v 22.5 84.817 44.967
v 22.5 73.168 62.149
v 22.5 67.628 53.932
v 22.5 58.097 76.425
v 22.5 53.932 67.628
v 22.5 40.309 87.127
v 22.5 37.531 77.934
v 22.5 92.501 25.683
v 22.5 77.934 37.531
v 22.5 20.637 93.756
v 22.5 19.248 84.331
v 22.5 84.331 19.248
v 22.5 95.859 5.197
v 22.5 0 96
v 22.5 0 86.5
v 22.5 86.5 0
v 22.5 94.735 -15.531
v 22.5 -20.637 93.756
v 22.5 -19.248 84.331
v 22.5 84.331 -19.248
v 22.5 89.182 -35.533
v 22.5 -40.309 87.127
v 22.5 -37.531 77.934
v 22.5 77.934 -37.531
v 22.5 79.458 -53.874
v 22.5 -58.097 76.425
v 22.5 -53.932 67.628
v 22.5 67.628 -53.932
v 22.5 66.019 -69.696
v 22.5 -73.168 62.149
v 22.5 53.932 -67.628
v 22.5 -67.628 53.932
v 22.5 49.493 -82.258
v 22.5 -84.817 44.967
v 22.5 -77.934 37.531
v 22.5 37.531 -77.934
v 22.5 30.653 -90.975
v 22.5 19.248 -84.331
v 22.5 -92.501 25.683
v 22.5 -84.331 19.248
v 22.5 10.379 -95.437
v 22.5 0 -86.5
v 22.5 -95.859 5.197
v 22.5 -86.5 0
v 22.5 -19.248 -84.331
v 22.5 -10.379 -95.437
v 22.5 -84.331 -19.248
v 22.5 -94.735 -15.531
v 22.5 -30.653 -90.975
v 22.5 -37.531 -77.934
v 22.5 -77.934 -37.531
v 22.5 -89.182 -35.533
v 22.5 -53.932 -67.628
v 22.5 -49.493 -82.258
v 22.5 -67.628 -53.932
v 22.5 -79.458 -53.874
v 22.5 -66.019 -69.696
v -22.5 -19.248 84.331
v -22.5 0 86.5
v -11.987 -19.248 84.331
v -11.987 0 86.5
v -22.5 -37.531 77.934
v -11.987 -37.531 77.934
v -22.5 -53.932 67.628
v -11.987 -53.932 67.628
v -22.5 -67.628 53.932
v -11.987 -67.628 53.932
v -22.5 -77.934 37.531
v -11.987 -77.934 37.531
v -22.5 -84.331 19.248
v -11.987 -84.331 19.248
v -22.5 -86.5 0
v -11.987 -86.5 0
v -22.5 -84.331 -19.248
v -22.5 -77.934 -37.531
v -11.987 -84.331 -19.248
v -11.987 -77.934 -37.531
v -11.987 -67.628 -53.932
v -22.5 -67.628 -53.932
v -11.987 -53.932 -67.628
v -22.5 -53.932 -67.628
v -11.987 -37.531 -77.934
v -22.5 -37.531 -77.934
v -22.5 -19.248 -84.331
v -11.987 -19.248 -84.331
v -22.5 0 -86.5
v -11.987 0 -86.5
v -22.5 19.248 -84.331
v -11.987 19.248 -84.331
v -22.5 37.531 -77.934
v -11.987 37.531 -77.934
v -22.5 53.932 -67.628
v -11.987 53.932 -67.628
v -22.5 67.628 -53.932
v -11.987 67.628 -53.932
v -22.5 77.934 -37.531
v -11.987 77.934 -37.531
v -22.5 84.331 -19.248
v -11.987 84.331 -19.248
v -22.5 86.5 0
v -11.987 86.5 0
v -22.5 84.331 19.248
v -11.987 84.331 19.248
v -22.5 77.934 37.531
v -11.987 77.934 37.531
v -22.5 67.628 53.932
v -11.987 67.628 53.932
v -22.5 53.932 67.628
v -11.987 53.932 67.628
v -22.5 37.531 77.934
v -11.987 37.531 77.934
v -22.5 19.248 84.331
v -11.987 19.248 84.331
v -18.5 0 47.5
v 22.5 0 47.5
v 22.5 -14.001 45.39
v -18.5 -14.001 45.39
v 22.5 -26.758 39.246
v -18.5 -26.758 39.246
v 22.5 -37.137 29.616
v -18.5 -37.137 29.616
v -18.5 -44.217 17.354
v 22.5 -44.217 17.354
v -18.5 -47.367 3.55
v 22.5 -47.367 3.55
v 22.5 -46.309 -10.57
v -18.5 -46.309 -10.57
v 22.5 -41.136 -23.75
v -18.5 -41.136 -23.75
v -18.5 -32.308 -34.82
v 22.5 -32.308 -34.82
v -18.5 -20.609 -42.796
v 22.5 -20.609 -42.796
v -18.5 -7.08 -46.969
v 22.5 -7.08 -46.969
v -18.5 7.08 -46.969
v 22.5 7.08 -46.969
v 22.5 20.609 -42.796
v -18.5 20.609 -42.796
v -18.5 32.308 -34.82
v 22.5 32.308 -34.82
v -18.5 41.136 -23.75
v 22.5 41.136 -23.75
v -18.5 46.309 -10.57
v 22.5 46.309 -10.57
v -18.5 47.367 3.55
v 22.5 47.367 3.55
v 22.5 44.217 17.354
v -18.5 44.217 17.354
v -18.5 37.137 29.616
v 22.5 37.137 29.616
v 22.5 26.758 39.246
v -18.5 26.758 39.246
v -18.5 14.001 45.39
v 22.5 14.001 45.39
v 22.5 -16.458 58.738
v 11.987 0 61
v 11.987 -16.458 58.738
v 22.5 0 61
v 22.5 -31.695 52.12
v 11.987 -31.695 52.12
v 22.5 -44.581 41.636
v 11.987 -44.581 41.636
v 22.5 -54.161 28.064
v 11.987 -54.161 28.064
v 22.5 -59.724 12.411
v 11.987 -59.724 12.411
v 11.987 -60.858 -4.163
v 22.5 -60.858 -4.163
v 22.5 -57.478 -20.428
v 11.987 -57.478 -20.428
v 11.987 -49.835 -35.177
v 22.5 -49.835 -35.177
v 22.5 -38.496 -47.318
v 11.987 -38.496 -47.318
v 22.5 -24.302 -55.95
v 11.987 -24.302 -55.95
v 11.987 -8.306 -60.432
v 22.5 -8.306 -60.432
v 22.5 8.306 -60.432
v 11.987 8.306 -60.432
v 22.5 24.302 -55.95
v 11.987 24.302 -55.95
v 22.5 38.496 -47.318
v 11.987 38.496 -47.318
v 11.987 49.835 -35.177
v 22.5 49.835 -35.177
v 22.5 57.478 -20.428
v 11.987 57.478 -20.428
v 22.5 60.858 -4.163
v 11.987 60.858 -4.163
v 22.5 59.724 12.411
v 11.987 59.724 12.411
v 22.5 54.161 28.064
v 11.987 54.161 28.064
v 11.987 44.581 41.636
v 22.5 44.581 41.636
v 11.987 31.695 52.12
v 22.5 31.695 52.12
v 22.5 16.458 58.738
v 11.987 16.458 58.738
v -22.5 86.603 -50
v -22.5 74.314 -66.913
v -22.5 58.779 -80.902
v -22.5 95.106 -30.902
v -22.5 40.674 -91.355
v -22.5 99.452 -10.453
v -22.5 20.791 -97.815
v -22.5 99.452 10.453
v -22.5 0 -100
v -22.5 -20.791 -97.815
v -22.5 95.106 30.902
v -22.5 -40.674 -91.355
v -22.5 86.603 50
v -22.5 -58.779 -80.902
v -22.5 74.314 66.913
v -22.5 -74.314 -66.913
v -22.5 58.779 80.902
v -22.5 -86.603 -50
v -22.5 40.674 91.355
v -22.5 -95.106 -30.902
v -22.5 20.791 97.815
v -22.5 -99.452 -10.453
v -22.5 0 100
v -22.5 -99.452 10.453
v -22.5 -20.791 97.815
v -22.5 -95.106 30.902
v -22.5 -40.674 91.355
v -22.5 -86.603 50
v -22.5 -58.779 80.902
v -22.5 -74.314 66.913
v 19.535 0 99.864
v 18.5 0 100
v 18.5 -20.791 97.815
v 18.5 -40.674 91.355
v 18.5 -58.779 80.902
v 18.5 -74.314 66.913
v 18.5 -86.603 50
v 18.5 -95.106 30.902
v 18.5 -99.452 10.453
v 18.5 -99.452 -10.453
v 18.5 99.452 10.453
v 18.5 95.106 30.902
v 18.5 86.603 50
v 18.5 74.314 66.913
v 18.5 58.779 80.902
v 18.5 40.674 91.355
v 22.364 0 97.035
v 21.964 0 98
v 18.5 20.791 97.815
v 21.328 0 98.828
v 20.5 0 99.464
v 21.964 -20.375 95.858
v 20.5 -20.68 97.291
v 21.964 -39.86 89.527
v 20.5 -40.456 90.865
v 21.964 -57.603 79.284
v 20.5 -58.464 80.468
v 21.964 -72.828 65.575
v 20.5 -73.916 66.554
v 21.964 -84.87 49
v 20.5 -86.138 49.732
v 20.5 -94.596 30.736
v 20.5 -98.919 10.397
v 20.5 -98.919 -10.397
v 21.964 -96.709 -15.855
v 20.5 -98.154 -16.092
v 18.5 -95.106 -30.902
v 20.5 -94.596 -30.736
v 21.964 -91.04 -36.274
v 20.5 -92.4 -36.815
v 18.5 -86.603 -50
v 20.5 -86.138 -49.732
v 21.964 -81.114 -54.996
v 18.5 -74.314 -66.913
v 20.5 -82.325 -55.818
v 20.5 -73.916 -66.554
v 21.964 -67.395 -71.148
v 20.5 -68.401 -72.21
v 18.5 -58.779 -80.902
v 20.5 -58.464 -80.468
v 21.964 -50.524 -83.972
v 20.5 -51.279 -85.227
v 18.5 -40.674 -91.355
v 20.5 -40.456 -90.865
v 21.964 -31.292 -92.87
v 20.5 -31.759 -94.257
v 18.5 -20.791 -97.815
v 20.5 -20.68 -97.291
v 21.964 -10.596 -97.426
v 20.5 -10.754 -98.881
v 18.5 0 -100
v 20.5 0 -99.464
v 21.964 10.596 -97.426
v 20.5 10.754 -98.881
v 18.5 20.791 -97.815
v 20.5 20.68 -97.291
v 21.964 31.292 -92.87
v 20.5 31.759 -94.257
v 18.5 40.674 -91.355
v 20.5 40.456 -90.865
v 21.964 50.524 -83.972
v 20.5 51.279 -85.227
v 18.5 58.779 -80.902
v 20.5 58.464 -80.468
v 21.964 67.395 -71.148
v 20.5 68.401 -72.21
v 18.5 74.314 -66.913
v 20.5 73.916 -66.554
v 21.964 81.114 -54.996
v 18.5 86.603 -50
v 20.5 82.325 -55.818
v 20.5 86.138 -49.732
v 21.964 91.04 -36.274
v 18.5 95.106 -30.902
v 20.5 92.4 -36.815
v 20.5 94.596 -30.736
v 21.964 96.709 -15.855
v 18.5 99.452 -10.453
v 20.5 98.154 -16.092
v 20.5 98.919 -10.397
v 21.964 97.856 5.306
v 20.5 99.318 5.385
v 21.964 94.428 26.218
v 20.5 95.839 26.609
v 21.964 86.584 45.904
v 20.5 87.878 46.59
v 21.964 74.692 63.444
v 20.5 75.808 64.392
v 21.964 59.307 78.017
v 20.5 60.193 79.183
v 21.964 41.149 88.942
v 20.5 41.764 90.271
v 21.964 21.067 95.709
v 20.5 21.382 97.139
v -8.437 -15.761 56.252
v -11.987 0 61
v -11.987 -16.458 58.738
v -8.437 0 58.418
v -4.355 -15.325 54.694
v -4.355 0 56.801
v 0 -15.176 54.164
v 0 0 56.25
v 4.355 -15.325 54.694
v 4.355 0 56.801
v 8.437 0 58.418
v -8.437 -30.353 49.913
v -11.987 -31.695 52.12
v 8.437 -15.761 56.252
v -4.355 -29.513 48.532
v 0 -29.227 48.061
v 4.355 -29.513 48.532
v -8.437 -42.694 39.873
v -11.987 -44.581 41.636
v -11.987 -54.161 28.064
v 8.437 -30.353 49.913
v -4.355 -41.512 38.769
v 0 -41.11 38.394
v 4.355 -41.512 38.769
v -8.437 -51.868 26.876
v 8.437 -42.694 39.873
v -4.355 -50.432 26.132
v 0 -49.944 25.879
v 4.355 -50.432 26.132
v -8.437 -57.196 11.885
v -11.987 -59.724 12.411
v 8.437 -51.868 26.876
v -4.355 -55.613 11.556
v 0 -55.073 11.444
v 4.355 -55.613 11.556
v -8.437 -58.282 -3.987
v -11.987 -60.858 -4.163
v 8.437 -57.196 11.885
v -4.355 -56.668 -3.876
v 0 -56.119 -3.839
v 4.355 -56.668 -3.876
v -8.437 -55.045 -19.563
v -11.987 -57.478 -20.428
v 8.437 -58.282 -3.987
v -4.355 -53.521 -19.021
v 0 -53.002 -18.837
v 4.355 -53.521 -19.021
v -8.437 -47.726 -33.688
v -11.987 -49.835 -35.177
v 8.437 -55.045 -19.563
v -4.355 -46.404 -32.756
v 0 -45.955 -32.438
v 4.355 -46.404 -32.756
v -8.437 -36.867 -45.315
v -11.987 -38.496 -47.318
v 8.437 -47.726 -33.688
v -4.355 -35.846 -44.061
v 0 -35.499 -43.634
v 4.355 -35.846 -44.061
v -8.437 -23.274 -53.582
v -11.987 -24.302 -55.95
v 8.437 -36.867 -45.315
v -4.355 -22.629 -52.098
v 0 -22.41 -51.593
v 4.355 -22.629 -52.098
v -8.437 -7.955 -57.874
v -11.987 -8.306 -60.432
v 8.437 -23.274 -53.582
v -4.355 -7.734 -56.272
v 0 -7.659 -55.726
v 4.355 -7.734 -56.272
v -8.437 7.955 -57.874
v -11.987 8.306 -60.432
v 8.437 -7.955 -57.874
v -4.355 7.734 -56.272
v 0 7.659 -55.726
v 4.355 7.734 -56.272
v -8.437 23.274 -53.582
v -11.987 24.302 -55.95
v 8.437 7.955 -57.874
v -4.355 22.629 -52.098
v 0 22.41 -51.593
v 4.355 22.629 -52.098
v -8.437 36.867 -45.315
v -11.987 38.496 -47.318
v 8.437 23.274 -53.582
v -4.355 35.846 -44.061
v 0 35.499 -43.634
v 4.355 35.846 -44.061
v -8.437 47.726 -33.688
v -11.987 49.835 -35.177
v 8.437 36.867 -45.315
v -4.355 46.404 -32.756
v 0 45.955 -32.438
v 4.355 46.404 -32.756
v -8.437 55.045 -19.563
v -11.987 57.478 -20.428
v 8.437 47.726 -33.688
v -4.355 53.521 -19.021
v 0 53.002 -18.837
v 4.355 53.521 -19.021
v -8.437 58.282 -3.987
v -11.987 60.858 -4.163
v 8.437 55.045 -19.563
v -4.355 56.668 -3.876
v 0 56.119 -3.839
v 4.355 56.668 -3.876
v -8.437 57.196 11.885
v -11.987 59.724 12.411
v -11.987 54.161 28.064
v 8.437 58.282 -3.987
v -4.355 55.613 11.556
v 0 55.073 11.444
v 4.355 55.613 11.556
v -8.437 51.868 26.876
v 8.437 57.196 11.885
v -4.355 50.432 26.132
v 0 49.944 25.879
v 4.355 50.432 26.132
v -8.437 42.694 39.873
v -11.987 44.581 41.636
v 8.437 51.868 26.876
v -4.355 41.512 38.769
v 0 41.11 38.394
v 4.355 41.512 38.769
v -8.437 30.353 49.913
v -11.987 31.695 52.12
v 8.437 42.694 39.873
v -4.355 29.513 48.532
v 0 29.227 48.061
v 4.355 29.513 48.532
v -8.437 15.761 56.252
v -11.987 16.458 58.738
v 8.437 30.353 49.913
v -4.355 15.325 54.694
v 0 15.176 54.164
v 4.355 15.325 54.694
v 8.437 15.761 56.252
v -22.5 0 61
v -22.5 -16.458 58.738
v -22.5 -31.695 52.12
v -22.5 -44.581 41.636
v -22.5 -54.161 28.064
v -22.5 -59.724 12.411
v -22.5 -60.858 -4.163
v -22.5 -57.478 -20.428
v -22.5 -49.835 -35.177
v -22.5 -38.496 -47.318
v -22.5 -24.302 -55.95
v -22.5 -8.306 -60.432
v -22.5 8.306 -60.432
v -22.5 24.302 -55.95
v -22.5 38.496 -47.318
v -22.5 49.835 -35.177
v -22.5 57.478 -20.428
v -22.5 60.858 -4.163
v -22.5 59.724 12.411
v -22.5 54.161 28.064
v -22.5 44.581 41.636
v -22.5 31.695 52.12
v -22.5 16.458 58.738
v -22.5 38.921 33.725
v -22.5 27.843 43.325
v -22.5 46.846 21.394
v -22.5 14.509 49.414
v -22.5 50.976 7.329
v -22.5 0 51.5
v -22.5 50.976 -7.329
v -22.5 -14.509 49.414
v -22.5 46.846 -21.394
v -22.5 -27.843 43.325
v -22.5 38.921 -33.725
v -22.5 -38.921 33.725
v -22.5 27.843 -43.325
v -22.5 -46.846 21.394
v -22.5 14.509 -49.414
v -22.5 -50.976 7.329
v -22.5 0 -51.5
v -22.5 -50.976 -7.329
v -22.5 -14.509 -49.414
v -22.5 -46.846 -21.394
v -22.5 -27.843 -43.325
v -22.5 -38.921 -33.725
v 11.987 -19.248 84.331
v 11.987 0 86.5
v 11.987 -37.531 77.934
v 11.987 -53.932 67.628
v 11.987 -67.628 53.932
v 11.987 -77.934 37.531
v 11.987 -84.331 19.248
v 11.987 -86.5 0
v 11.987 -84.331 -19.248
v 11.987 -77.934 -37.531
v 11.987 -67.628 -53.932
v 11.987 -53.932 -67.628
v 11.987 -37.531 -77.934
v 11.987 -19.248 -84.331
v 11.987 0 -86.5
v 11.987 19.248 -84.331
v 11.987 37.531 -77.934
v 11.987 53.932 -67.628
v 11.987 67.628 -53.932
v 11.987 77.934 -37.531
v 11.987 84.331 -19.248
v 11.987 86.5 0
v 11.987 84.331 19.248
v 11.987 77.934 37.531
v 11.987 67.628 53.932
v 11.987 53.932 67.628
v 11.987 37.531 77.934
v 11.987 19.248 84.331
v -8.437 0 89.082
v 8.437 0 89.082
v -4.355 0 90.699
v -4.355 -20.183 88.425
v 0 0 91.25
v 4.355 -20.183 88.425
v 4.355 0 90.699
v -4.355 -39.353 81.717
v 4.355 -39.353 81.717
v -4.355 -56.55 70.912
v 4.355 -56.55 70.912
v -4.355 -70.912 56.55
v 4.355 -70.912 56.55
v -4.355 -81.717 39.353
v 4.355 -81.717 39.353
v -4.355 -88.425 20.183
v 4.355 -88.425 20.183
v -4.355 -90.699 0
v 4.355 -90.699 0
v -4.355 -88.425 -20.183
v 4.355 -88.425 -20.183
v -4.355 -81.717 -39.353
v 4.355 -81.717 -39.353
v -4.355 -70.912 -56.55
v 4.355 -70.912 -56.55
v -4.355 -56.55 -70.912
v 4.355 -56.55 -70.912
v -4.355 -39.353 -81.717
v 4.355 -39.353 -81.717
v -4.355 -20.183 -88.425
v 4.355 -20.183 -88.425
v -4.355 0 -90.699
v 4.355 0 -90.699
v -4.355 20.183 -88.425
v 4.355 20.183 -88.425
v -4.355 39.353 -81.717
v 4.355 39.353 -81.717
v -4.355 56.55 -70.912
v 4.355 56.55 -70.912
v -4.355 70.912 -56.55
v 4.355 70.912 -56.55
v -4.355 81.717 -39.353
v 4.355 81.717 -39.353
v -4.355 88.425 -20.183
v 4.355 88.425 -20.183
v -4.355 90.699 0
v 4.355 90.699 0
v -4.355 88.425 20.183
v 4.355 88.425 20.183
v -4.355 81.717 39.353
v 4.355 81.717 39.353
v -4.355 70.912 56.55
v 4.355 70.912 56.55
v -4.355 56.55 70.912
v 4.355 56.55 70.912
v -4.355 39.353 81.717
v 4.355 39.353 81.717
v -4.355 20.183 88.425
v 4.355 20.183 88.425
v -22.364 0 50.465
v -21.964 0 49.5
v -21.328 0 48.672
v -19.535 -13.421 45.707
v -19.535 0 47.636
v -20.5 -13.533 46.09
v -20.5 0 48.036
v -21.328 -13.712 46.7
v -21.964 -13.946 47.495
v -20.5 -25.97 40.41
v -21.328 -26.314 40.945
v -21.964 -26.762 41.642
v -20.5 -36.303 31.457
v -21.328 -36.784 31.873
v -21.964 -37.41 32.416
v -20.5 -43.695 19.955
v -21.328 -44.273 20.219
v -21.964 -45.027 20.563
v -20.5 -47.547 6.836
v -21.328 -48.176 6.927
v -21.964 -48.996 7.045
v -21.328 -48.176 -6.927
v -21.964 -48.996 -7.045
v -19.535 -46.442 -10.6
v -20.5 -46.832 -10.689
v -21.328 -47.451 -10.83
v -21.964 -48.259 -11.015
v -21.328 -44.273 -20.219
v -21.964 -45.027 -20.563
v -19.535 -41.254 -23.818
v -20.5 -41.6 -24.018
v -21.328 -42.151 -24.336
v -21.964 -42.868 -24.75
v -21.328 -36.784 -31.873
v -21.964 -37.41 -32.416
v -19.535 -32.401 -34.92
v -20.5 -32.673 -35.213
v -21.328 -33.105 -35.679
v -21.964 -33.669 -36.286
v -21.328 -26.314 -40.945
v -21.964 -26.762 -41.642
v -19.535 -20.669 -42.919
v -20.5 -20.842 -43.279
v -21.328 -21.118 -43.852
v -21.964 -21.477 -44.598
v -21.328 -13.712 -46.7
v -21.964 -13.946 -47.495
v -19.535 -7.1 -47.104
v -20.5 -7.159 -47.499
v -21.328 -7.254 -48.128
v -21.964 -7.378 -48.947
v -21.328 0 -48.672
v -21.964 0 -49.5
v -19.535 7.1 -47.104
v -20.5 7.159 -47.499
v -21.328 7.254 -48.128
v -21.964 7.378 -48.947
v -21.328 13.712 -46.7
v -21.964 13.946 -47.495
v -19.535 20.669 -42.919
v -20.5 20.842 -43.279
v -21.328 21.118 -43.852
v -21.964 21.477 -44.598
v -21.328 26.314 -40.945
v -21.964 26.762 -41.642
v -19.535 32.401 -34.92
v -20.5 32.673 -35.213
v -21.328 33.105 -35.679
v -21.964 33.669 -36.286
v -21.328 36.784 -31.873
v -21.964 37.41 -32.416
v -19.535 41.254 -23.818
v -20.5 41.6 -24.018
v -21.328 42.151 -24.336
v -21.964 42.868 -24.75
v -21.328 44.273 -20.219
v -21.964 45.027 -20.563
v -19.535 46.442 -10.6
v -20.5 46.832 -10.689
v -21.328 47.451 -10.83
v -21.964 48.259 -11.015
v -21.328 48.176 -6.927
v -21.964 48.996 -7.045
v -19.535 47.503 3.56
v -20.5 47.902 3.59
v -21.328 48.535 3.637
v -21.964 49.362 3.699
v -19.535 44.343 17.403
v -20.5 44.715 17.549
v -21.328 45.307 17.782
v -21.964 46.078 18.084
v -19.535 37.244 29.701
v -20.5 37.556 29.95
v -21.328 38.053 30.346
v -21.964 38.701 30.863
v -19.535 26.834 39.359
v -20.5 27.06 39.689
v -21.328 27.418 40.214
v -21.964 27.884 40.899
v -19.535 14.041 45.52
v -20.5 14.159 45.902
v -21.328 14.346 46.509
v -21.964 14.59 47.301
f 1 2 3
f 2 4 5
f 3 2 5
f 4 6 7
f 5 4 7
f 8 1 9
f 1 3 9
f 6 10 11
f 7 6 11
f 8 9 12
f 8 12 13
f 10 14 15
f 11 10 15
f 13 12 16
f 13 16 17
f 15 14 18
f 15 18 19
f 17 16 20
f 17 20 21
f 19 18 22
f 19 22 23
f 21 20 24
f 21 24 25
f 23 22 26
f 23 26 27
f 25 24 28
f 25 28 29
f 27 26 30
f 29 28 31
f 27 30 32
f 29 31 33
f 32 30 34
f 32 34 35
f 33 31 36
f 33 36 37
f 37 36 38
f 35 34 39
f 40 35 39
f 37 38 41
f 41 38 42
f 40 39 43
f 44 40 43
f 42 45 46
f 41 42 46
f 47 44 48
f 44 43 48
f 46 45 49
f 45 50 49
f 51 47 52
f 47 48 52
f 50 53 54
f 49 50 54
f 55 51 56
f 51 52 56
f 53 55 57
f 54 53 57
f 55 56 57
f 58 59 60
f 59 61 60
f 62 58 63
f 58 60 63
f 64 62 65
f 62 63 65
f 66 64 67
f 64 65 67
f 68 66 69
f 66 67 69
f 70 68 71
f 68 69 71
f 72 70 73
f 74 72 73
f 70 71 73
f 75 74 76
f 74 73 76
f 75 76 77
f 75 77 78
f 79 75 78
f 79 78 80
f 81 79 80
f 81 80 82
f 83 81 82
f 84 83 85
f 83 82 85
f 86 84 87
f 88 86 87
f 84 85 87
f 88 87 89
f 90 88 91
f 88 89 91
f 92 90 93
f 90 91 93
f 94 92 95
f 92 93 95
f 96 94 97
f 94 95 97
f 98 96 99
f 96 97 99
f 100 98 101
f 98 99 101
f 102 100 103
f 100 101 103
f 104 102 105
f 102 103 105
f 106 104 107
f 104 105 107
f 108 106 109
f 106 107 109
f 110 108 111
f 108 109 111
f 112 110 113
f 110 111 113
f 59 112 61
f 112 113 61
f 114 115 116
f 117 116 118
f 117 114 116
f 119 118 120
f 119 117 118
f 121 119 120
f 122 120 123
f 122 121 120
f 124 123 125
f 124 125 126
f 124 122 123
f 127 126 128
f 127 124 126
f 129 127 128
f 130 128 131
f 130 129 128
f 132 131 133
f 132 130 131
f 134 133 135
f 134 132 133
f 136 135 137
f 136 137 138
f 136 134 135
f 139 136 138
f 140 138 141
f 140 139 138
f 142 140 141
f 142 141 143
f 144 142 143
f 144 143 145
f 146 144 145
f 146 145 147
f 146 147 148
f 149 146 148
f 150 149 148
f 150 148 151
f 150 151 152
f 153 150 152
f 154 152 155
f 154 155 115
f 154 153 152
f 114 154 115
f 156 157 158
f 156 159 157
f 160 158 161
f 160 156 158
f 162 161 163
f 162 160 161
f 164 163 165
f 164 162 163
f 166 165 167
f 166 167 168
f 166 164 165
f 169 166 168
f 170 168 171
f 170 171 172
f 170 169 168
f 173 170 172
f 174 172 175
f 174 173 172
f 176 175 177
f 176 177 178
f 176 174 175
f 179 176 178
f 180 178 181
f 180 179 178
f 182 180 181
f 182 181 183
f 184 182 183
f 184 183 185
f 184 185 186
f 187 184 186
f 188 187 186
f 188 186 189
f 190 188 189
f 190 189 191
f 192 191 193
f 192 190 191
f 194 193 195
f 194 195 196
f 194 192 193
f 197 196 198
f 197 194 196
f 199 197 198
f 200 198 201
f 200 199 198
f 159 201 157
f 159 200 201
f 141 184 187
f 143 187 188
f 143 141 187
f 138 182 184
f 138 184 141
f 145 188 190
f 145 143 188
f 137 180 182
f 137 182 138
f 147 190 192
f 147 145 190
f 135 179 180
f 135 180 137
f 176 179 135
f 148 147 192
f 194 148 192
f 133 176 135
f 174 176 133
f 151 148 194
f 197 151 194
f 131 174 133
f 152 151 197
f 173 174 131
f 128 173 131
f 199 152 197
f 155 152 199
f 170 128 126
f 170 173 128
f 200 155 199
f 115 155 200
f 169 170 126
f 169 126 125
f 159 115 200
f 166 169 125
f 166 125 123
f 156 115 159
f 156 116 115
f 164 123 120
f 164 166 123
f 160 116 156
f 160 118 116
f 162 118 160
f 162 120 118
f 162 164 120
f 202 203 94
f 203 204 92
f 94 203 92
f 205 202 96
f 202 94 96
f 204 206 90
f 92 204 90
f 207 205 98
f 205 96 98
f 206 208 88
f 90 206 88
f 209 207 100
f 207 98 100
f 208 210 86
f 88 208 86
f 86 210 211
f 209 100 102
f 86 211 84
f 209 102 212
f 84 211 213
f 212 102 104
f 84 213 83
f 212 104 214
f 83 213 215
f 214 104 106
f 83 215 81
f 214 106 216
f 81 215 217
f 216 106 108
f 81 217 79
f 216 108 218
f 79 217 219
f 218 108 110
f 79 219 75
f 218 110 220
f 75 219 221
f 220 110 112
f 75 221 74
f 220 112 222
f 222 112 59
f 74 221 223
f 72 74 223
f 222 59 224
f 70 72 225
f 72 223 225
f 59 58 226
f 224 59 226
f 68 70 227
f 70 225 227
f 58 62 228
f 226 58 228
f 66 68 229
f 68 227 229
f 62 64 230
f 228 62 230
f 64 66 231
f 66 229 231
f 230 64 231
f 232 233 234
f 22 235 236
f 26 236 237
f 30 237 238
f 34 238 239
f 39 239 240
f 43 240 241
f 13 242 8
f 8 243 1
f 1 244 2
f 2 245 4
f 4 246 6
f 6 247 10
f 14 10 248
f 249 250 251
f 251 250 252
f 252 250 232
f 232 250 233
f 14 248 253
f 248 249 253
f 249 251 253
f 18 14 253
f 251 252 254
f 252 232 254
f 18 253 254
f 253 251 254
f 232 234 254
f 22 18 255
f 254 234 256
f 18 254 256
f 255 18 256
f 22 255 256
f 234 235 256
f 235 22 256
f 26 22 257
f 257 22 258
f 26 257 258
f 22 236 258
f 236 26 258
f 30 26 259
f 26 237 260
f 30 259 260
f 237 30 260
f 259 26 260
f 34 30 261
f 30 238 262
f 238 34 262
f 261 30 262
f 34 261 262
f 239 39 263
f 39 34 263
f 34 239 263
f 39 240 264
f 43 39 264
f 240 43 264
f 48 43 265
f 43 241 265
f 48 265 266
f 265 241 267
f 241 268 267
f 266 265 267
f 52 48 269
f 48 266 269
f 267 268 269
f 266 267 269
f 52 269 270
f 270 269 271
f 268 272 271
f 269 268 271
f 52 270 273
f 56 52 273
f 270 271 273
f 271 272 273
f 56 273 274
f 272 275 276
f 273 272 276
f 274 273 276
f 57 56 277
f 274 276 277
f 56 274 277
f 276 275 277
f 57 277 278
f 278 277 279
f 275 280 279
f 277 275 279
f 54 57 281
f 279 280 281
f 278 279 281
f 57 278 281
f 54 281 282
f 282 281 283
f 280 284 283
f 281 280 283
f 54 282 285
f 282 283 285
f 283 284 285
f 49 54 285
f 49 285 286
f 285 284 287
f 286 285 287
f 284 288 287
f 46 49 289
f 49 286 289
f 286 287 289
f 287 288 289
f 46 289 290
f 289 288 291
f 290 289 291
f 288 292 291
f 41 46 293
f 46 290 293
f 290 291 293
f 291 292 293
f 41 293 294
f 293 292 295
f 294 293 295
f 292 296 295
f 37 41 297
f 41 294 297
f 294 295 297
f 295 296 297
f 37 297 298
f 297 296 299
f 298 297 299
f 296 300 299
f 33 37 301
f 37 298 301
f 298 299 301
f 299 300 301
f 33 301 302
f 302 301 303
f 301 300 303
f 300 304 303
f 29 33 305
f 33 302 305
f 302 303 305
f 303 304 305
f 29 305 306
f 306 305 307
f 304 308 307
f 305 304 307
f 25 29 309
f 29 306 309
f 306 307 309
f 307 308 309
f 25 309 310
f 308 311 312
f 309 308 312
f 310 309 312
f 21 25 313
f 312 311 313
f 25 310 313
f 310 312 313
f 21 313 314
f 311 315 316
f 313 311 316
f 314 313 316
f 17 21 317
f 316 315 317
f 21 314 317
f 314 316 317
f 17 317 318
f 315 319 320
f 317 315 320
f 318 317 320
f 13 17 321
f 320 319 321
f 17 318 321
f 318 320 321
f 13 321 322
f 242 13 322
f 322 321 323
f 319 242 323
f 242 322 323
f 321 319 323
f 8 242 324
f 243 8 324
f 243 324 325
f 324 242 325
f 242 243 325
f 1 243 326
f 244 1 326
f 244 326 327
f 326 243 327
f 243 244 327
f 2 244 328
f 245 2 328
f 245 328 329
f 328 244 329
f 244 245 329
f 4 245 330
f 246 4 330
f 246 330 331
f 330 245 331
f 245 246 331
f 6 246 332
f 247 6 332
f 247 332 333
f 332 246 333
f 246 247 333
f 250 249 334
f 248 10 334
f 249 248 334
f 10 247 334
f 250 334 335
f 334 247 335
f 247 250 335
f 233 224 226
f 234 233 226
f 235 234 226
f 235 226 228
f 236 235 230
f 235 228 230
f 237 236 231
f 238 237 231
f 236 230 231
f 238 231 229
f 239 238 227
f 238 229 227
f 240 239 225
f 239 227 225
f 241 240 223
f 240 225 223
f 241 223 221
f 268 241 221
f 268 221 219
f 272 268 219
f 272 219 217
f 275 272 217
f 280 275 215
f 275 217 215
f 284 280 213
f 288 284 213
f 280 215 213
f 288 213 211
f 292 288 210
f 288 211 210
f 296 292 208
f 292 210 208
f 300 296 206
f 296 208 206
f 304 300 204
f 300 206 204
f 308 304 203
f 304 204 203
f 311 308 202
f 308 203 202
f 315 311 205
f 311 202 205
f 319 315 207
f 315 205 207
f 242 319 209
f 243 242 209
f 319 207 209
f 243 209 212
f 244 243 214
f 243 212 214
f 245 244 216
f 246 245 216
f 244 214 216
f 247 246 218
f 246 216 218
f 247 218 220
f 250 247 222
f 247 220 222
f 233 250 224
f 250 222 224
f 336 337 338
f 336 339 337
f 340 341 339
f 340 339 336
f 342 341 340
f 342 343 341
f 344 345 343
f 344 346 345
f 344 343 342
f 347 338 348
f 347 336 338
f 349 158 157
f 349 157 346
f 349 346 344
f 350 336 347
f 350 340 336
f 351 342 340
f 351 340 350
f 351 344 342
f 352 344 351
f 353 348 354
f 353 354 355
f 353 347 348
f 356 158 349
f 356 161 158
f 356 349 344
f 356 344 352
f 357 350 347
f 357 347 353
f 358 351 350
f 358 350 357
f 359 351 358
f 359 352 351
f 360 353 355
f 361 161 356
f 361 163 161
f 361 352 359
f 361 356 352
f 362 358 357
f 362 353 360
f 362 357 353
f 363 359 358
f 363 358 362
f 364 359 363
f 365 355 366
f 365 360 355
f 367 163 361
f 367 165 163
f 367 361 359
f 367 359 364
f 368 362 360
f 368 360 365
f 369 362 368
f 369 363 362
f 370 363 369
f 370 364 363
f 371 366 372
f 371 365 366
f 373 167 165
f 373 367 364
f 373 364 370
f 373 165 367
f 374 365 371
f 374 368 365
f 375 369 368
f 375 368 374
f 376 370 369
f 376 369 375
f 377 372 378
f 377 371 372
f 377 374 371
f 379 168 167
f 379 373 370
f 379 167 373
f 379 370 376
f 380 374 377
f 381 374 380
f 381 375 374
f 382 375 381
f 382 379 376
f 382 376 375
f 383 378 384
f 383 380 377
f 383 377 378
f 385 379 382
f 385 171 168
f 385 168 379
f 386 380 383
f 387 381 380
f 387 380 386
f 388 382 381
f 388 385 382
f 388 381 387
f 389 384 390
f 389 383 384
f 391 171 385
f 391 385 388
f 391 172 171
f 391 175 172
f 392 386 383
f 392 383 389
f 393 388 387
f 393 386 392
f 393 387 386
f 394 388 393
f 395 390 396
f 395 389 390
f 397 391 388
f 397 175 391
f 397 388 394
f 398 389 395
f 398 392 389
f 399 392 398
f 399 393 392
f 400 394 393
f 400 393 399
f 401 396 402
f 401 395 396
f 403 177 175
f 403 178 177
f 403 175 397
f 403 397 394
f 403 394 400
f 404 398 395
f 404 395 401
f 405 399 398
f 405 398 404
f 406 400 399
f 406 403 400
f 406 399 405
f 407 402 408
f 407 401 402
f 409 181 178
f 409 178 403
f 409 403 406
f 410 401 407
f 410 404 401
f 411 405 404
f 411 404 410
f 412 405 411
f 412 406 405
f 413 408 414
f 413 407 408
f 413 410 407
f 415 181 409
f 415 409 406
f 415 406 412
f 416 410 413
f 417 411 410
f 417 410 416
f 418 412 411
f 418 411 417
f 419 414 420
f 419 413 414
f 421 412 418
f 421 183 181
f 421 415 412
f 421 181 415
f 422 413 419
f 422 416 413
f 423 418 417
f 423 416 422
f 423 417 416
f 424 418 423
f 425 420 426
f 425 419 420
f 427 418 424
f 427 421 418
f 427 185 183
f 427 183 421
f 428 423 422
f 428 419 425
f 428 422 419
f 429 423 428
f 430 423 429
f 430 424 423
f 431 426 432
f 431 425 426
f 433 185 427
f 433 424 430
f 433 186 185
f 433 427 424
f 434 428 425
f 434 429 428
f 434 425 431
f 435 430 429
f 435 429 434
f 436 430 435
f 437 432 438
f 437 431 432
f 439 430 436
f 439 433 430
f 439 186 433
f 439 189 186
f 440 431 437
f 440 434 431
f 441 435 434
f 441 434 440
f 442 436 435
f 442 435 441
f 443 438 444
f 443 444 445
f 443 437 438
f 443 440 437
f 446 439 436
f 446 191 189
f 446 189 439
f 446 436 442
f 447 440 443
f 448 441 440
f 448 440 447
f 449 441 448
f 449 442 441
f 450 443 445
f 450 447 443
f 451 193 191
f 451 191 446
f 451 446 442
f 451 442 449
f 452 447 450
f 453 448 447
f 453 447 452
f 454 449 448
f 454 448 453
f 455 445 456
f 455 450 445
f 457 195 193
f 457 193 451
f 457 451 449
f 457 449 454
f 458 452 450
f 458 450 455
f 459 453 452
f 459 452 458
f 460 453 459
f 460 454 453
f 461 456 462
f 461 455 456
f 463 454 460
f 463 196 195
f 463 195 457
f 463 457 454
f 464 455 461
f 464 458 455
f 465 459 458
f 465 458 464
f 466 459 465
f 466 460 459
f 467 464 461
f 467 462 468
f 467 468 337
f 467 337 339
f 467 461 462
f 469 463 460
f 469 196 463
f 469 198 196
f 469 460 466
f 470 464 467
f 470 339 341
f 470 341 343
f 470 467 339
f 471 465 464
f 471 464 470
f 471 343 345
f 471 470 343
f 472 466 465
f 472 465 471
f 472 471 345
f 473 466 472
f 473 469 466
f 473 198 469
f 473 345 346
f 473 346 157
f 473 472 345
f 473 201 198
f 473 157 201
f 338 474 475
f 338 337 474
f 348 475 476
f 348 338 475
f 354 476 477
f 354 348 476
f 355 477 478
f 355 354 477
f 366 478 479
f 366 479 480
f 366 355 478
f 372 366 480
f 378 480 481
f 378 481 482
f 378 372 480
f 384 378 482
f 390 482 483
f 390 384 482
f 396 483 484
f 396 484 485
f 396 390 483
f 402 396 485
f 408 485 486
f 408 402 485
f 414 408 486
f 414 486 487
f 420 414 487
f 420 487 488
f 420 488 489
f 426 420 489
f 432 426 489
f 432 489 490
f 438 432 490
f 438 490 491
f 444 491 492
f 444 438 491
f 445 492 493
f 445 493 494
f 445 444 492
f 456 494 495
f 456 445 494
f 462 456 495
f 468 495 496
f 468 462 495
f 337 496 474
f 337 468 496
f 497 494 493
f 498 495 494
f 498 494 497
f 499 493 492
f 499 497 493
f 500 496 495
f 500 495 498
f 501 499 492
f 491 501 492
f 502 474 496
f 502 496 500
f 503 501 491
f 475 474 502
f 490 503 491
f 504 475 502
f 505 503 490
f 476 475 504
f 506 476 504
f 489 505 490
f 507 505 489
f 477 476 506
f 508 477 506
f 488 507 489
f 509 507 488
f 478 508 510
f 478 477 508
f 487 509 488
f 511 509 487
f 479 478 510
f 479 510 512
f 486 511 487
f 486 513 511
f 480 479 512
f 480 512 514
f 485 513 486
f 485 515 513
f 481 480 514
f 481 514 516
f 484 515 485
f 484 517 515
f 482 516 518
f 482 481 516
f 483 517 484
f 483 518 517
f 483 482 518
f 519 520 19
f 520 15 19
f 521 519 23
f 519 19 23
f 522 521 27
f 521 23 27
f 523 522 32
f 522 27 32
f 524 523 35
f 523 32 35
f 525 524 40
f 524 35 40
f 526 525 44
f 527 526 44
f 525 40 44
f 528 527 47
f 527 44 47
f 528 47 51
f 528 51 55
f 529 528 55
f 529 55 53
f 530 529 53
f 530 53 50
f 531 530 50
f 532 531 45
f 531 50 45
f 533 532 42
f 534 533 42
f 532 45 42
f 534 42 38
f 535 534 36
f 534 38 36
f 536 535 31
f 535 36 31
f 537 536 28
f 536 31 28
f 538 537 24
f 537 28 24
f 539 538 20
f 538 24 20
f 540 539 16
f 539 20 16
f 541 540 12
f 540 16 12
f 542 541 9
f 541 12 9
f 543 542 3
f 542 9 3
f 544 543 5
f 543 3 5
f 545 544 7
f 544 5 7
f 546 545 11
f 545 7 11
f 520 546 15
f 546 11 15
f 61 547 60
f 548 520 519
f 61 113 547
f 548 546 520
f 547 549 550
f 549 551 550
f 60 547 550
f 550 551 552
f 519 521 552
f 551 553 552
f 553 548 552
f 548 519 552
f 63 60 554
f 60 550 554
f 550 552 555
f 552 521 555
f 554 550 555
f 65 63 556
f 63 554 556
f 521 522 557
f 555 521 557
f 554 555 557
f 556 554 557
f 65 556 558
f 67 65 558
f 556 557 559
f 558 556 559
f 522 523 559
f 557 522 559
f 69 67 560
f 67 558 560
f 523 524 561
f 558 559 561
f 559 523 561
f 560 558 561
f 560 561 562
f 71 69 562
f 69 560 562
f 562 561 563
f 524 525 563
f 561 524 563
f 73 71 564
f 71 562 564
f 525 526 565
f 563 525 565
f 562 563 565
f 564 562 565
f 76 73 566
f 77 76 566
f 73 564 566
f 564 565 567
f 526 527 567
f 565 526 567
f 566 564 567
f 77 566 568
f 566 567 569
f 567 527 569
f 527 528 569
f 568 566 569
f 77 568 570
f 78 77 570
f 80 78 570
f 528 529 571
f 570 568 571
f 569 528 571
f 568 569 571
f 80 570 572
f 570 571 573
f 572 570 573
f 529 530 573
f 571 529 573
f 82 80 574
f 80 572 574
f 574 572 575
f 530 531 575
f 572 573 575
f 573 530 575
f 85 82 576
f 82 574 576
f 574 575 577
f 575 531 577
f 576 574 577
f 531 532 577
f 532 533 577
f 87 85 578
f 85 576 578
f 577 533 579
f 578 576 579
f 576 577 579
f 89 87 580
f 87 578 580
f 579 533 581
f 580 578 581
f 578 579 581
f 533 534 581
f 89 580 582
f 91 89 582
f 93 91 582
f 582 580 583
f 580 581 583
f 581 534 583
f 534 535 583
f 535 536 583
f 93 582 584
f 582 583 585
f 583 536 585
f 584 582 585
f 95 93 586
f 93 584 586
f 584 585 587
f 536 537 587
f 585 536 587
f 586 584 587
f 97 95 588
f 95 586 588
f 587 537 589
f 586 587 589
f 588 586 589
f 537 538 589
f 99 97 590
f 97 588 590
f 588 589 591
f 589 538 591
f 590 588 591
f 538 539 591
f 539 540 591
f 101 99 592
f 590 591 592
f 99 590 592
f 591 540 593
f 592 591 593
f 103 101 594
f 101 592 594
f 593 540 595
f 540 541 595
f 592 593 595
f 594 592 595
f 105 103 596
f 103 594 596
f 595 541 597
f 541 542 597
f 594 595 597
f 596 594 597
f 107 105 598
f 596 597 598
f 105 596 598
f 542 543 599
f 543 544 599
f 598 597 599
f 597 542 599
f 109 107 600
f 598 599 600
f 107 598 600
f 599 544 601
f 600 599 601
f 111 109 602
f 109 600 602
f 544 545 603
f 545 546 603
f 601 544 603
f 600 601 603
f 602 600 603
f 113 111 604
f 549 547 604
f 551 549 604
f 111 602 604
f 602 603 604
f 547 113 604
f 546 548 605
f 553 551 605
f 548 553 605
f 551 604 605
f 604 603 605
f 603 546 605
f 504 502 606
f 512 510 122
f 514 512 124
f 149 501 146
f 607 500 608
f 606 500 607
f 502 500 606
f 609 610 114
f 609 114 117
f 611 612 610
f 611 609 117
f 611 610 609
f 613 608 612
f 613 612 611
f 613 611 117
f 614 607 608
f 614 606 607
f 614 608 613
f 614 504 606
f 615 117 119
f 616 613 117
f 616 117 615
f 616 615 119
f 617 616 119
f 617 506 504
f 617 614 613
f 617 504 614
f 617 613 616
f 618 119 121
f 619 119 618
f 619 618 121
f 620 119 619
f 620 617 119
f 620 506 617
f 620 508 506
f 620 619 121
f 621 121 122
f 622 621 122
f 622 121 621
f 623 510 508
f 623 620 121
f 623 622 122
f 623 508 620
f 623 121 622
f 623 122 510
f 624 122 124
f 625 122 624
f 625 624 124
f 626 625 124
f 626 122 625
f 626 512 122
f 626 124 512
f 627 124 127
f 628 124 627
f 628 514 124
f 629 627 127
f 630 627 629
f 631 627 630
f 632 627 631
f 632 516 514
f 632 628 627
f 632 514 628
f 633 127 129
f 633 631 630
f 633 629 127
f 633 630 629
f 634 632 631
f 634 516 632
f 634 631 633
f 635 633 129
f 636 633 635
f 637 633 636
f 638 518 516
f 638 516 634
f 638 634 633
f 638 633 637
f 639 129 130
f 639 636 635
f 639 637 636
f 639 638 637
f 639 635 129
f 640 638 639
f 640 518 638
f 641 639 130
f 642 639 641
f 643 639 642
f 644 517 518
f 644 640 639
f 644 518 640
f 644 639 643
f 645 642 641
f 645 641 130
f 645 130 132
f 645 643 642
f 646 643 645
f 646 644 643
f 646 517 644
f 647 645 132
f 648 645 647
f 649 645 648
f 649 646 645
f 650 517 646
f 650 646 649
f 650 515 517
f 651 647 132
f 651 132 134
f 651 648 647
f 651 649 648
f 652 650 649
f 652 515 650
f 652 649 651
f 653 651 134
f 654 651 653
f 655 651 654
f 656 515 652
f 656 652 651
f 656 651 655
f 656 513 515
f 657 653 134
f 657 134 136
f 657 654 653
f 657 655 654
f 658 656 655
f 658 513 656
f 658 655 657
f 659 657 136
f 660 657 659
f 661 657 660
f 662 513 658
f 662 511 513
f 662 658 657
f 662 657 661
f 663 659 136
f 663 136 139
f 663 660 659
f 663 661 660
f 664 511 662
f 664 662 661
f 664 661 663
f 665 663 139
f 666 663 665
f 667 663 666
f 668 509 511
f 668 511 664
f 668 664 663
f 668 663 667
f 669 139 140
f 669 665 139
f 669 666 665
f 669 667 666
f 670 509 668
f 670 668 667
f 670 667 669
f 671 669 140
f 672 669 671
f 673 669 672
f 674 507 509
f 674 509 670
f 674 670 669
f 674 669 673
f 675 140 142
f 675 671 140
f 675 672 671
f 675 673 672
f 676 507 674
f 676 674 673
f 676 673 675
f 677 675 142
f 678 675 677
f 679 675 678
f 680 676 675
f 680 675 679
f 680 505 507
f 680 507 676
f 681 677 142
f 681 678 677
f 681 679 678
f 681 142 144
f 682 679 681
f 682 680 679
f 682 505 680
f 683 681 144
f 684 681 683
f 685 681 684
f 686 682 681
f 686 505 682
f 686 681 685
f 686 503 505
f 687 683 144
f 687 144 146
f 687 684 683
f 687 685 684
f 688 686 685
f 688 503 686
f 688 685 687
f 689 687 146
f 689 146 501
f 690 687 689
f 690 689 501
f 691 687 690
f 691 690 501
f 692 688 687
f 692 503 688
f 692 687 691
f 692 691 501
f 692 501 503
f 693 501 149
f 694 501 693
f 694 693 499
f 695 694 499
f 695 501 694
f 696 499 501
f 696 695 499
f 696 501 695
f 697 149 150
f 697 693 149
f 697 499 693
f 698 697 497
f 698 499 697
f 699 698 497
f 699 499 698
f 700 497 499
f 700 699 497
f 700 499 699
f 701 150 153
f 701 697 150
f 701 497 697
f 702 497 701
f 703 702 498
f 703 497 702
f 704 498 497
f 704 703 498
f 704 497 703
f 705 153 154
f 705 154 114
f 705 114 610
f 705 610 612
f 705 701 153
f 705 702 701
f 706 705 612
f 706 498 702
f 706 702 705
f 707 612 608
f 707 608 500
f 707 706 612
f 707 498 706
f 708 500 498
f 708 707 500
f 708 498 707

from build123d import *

# Parameters (mm, degrees)
FILLET_1_R = 4
FILLET_2_R = 4


with BuildPart() as part:
    # 草图1 → 旋转1 (revolve)
    with BuildSketch(Plane.XY, mode=Mode.PRIVATE) as revolve_1_sk:
        with BuildLine():
            Line((11.986972095, 86.5), (22.5, 86.5))
            Line((22.5, 86.5), (22.5, 100))
            Line((22.5, 100), (-22.5, 100))
            Line((-22.5, 100), (-22.5, 86.5))
            Line((-22.5, 86.5), (-11.986972095, 86.5))
            ThreePointArc((-11.986972095, 86.5), (0, 91.25), (11.986972095, 86.5))
        make_face()
        with BuildLine():
            Line((-22.5, 61), (-11.986972095, 61))
            ThreePointArc((-11.986972095, 61), (0, 56.25), (11.986972095, 61))
            Line((11.986972095, 61), (22.5, 61))
            Line((22.5, 61), (22.5, 47.5))
            Line((22.5, 47.5), (-22.5, 47.5))
            Line((-22.5, 47.5), (-22.5, 61))
        make_face()
    revolve(revolve_1_sk.sketch.rotate(Axis((-49.659284853, 0, 0), (1, 0, 0)), 90), axis=Axis((-49.659284853, 0, 0), (1, 0, 0)))

    # 圆角1
    fillet_1_edges = [part.edges().sort_by_distance(p)[0] for p in [
        (22.5, 0, -100),
    ]]
    fillet(fillet_1_edges, radius=FILLET_1_R)

    # 圆角2
    fillet_2_edges = [part.edges().sort_by_distance(p)[0] for p in [
        (-22.5, 0, -47.5),
    ]]
    fillet(fillet_2_edges, radius=FILLET_2_R)


solid = part.part
